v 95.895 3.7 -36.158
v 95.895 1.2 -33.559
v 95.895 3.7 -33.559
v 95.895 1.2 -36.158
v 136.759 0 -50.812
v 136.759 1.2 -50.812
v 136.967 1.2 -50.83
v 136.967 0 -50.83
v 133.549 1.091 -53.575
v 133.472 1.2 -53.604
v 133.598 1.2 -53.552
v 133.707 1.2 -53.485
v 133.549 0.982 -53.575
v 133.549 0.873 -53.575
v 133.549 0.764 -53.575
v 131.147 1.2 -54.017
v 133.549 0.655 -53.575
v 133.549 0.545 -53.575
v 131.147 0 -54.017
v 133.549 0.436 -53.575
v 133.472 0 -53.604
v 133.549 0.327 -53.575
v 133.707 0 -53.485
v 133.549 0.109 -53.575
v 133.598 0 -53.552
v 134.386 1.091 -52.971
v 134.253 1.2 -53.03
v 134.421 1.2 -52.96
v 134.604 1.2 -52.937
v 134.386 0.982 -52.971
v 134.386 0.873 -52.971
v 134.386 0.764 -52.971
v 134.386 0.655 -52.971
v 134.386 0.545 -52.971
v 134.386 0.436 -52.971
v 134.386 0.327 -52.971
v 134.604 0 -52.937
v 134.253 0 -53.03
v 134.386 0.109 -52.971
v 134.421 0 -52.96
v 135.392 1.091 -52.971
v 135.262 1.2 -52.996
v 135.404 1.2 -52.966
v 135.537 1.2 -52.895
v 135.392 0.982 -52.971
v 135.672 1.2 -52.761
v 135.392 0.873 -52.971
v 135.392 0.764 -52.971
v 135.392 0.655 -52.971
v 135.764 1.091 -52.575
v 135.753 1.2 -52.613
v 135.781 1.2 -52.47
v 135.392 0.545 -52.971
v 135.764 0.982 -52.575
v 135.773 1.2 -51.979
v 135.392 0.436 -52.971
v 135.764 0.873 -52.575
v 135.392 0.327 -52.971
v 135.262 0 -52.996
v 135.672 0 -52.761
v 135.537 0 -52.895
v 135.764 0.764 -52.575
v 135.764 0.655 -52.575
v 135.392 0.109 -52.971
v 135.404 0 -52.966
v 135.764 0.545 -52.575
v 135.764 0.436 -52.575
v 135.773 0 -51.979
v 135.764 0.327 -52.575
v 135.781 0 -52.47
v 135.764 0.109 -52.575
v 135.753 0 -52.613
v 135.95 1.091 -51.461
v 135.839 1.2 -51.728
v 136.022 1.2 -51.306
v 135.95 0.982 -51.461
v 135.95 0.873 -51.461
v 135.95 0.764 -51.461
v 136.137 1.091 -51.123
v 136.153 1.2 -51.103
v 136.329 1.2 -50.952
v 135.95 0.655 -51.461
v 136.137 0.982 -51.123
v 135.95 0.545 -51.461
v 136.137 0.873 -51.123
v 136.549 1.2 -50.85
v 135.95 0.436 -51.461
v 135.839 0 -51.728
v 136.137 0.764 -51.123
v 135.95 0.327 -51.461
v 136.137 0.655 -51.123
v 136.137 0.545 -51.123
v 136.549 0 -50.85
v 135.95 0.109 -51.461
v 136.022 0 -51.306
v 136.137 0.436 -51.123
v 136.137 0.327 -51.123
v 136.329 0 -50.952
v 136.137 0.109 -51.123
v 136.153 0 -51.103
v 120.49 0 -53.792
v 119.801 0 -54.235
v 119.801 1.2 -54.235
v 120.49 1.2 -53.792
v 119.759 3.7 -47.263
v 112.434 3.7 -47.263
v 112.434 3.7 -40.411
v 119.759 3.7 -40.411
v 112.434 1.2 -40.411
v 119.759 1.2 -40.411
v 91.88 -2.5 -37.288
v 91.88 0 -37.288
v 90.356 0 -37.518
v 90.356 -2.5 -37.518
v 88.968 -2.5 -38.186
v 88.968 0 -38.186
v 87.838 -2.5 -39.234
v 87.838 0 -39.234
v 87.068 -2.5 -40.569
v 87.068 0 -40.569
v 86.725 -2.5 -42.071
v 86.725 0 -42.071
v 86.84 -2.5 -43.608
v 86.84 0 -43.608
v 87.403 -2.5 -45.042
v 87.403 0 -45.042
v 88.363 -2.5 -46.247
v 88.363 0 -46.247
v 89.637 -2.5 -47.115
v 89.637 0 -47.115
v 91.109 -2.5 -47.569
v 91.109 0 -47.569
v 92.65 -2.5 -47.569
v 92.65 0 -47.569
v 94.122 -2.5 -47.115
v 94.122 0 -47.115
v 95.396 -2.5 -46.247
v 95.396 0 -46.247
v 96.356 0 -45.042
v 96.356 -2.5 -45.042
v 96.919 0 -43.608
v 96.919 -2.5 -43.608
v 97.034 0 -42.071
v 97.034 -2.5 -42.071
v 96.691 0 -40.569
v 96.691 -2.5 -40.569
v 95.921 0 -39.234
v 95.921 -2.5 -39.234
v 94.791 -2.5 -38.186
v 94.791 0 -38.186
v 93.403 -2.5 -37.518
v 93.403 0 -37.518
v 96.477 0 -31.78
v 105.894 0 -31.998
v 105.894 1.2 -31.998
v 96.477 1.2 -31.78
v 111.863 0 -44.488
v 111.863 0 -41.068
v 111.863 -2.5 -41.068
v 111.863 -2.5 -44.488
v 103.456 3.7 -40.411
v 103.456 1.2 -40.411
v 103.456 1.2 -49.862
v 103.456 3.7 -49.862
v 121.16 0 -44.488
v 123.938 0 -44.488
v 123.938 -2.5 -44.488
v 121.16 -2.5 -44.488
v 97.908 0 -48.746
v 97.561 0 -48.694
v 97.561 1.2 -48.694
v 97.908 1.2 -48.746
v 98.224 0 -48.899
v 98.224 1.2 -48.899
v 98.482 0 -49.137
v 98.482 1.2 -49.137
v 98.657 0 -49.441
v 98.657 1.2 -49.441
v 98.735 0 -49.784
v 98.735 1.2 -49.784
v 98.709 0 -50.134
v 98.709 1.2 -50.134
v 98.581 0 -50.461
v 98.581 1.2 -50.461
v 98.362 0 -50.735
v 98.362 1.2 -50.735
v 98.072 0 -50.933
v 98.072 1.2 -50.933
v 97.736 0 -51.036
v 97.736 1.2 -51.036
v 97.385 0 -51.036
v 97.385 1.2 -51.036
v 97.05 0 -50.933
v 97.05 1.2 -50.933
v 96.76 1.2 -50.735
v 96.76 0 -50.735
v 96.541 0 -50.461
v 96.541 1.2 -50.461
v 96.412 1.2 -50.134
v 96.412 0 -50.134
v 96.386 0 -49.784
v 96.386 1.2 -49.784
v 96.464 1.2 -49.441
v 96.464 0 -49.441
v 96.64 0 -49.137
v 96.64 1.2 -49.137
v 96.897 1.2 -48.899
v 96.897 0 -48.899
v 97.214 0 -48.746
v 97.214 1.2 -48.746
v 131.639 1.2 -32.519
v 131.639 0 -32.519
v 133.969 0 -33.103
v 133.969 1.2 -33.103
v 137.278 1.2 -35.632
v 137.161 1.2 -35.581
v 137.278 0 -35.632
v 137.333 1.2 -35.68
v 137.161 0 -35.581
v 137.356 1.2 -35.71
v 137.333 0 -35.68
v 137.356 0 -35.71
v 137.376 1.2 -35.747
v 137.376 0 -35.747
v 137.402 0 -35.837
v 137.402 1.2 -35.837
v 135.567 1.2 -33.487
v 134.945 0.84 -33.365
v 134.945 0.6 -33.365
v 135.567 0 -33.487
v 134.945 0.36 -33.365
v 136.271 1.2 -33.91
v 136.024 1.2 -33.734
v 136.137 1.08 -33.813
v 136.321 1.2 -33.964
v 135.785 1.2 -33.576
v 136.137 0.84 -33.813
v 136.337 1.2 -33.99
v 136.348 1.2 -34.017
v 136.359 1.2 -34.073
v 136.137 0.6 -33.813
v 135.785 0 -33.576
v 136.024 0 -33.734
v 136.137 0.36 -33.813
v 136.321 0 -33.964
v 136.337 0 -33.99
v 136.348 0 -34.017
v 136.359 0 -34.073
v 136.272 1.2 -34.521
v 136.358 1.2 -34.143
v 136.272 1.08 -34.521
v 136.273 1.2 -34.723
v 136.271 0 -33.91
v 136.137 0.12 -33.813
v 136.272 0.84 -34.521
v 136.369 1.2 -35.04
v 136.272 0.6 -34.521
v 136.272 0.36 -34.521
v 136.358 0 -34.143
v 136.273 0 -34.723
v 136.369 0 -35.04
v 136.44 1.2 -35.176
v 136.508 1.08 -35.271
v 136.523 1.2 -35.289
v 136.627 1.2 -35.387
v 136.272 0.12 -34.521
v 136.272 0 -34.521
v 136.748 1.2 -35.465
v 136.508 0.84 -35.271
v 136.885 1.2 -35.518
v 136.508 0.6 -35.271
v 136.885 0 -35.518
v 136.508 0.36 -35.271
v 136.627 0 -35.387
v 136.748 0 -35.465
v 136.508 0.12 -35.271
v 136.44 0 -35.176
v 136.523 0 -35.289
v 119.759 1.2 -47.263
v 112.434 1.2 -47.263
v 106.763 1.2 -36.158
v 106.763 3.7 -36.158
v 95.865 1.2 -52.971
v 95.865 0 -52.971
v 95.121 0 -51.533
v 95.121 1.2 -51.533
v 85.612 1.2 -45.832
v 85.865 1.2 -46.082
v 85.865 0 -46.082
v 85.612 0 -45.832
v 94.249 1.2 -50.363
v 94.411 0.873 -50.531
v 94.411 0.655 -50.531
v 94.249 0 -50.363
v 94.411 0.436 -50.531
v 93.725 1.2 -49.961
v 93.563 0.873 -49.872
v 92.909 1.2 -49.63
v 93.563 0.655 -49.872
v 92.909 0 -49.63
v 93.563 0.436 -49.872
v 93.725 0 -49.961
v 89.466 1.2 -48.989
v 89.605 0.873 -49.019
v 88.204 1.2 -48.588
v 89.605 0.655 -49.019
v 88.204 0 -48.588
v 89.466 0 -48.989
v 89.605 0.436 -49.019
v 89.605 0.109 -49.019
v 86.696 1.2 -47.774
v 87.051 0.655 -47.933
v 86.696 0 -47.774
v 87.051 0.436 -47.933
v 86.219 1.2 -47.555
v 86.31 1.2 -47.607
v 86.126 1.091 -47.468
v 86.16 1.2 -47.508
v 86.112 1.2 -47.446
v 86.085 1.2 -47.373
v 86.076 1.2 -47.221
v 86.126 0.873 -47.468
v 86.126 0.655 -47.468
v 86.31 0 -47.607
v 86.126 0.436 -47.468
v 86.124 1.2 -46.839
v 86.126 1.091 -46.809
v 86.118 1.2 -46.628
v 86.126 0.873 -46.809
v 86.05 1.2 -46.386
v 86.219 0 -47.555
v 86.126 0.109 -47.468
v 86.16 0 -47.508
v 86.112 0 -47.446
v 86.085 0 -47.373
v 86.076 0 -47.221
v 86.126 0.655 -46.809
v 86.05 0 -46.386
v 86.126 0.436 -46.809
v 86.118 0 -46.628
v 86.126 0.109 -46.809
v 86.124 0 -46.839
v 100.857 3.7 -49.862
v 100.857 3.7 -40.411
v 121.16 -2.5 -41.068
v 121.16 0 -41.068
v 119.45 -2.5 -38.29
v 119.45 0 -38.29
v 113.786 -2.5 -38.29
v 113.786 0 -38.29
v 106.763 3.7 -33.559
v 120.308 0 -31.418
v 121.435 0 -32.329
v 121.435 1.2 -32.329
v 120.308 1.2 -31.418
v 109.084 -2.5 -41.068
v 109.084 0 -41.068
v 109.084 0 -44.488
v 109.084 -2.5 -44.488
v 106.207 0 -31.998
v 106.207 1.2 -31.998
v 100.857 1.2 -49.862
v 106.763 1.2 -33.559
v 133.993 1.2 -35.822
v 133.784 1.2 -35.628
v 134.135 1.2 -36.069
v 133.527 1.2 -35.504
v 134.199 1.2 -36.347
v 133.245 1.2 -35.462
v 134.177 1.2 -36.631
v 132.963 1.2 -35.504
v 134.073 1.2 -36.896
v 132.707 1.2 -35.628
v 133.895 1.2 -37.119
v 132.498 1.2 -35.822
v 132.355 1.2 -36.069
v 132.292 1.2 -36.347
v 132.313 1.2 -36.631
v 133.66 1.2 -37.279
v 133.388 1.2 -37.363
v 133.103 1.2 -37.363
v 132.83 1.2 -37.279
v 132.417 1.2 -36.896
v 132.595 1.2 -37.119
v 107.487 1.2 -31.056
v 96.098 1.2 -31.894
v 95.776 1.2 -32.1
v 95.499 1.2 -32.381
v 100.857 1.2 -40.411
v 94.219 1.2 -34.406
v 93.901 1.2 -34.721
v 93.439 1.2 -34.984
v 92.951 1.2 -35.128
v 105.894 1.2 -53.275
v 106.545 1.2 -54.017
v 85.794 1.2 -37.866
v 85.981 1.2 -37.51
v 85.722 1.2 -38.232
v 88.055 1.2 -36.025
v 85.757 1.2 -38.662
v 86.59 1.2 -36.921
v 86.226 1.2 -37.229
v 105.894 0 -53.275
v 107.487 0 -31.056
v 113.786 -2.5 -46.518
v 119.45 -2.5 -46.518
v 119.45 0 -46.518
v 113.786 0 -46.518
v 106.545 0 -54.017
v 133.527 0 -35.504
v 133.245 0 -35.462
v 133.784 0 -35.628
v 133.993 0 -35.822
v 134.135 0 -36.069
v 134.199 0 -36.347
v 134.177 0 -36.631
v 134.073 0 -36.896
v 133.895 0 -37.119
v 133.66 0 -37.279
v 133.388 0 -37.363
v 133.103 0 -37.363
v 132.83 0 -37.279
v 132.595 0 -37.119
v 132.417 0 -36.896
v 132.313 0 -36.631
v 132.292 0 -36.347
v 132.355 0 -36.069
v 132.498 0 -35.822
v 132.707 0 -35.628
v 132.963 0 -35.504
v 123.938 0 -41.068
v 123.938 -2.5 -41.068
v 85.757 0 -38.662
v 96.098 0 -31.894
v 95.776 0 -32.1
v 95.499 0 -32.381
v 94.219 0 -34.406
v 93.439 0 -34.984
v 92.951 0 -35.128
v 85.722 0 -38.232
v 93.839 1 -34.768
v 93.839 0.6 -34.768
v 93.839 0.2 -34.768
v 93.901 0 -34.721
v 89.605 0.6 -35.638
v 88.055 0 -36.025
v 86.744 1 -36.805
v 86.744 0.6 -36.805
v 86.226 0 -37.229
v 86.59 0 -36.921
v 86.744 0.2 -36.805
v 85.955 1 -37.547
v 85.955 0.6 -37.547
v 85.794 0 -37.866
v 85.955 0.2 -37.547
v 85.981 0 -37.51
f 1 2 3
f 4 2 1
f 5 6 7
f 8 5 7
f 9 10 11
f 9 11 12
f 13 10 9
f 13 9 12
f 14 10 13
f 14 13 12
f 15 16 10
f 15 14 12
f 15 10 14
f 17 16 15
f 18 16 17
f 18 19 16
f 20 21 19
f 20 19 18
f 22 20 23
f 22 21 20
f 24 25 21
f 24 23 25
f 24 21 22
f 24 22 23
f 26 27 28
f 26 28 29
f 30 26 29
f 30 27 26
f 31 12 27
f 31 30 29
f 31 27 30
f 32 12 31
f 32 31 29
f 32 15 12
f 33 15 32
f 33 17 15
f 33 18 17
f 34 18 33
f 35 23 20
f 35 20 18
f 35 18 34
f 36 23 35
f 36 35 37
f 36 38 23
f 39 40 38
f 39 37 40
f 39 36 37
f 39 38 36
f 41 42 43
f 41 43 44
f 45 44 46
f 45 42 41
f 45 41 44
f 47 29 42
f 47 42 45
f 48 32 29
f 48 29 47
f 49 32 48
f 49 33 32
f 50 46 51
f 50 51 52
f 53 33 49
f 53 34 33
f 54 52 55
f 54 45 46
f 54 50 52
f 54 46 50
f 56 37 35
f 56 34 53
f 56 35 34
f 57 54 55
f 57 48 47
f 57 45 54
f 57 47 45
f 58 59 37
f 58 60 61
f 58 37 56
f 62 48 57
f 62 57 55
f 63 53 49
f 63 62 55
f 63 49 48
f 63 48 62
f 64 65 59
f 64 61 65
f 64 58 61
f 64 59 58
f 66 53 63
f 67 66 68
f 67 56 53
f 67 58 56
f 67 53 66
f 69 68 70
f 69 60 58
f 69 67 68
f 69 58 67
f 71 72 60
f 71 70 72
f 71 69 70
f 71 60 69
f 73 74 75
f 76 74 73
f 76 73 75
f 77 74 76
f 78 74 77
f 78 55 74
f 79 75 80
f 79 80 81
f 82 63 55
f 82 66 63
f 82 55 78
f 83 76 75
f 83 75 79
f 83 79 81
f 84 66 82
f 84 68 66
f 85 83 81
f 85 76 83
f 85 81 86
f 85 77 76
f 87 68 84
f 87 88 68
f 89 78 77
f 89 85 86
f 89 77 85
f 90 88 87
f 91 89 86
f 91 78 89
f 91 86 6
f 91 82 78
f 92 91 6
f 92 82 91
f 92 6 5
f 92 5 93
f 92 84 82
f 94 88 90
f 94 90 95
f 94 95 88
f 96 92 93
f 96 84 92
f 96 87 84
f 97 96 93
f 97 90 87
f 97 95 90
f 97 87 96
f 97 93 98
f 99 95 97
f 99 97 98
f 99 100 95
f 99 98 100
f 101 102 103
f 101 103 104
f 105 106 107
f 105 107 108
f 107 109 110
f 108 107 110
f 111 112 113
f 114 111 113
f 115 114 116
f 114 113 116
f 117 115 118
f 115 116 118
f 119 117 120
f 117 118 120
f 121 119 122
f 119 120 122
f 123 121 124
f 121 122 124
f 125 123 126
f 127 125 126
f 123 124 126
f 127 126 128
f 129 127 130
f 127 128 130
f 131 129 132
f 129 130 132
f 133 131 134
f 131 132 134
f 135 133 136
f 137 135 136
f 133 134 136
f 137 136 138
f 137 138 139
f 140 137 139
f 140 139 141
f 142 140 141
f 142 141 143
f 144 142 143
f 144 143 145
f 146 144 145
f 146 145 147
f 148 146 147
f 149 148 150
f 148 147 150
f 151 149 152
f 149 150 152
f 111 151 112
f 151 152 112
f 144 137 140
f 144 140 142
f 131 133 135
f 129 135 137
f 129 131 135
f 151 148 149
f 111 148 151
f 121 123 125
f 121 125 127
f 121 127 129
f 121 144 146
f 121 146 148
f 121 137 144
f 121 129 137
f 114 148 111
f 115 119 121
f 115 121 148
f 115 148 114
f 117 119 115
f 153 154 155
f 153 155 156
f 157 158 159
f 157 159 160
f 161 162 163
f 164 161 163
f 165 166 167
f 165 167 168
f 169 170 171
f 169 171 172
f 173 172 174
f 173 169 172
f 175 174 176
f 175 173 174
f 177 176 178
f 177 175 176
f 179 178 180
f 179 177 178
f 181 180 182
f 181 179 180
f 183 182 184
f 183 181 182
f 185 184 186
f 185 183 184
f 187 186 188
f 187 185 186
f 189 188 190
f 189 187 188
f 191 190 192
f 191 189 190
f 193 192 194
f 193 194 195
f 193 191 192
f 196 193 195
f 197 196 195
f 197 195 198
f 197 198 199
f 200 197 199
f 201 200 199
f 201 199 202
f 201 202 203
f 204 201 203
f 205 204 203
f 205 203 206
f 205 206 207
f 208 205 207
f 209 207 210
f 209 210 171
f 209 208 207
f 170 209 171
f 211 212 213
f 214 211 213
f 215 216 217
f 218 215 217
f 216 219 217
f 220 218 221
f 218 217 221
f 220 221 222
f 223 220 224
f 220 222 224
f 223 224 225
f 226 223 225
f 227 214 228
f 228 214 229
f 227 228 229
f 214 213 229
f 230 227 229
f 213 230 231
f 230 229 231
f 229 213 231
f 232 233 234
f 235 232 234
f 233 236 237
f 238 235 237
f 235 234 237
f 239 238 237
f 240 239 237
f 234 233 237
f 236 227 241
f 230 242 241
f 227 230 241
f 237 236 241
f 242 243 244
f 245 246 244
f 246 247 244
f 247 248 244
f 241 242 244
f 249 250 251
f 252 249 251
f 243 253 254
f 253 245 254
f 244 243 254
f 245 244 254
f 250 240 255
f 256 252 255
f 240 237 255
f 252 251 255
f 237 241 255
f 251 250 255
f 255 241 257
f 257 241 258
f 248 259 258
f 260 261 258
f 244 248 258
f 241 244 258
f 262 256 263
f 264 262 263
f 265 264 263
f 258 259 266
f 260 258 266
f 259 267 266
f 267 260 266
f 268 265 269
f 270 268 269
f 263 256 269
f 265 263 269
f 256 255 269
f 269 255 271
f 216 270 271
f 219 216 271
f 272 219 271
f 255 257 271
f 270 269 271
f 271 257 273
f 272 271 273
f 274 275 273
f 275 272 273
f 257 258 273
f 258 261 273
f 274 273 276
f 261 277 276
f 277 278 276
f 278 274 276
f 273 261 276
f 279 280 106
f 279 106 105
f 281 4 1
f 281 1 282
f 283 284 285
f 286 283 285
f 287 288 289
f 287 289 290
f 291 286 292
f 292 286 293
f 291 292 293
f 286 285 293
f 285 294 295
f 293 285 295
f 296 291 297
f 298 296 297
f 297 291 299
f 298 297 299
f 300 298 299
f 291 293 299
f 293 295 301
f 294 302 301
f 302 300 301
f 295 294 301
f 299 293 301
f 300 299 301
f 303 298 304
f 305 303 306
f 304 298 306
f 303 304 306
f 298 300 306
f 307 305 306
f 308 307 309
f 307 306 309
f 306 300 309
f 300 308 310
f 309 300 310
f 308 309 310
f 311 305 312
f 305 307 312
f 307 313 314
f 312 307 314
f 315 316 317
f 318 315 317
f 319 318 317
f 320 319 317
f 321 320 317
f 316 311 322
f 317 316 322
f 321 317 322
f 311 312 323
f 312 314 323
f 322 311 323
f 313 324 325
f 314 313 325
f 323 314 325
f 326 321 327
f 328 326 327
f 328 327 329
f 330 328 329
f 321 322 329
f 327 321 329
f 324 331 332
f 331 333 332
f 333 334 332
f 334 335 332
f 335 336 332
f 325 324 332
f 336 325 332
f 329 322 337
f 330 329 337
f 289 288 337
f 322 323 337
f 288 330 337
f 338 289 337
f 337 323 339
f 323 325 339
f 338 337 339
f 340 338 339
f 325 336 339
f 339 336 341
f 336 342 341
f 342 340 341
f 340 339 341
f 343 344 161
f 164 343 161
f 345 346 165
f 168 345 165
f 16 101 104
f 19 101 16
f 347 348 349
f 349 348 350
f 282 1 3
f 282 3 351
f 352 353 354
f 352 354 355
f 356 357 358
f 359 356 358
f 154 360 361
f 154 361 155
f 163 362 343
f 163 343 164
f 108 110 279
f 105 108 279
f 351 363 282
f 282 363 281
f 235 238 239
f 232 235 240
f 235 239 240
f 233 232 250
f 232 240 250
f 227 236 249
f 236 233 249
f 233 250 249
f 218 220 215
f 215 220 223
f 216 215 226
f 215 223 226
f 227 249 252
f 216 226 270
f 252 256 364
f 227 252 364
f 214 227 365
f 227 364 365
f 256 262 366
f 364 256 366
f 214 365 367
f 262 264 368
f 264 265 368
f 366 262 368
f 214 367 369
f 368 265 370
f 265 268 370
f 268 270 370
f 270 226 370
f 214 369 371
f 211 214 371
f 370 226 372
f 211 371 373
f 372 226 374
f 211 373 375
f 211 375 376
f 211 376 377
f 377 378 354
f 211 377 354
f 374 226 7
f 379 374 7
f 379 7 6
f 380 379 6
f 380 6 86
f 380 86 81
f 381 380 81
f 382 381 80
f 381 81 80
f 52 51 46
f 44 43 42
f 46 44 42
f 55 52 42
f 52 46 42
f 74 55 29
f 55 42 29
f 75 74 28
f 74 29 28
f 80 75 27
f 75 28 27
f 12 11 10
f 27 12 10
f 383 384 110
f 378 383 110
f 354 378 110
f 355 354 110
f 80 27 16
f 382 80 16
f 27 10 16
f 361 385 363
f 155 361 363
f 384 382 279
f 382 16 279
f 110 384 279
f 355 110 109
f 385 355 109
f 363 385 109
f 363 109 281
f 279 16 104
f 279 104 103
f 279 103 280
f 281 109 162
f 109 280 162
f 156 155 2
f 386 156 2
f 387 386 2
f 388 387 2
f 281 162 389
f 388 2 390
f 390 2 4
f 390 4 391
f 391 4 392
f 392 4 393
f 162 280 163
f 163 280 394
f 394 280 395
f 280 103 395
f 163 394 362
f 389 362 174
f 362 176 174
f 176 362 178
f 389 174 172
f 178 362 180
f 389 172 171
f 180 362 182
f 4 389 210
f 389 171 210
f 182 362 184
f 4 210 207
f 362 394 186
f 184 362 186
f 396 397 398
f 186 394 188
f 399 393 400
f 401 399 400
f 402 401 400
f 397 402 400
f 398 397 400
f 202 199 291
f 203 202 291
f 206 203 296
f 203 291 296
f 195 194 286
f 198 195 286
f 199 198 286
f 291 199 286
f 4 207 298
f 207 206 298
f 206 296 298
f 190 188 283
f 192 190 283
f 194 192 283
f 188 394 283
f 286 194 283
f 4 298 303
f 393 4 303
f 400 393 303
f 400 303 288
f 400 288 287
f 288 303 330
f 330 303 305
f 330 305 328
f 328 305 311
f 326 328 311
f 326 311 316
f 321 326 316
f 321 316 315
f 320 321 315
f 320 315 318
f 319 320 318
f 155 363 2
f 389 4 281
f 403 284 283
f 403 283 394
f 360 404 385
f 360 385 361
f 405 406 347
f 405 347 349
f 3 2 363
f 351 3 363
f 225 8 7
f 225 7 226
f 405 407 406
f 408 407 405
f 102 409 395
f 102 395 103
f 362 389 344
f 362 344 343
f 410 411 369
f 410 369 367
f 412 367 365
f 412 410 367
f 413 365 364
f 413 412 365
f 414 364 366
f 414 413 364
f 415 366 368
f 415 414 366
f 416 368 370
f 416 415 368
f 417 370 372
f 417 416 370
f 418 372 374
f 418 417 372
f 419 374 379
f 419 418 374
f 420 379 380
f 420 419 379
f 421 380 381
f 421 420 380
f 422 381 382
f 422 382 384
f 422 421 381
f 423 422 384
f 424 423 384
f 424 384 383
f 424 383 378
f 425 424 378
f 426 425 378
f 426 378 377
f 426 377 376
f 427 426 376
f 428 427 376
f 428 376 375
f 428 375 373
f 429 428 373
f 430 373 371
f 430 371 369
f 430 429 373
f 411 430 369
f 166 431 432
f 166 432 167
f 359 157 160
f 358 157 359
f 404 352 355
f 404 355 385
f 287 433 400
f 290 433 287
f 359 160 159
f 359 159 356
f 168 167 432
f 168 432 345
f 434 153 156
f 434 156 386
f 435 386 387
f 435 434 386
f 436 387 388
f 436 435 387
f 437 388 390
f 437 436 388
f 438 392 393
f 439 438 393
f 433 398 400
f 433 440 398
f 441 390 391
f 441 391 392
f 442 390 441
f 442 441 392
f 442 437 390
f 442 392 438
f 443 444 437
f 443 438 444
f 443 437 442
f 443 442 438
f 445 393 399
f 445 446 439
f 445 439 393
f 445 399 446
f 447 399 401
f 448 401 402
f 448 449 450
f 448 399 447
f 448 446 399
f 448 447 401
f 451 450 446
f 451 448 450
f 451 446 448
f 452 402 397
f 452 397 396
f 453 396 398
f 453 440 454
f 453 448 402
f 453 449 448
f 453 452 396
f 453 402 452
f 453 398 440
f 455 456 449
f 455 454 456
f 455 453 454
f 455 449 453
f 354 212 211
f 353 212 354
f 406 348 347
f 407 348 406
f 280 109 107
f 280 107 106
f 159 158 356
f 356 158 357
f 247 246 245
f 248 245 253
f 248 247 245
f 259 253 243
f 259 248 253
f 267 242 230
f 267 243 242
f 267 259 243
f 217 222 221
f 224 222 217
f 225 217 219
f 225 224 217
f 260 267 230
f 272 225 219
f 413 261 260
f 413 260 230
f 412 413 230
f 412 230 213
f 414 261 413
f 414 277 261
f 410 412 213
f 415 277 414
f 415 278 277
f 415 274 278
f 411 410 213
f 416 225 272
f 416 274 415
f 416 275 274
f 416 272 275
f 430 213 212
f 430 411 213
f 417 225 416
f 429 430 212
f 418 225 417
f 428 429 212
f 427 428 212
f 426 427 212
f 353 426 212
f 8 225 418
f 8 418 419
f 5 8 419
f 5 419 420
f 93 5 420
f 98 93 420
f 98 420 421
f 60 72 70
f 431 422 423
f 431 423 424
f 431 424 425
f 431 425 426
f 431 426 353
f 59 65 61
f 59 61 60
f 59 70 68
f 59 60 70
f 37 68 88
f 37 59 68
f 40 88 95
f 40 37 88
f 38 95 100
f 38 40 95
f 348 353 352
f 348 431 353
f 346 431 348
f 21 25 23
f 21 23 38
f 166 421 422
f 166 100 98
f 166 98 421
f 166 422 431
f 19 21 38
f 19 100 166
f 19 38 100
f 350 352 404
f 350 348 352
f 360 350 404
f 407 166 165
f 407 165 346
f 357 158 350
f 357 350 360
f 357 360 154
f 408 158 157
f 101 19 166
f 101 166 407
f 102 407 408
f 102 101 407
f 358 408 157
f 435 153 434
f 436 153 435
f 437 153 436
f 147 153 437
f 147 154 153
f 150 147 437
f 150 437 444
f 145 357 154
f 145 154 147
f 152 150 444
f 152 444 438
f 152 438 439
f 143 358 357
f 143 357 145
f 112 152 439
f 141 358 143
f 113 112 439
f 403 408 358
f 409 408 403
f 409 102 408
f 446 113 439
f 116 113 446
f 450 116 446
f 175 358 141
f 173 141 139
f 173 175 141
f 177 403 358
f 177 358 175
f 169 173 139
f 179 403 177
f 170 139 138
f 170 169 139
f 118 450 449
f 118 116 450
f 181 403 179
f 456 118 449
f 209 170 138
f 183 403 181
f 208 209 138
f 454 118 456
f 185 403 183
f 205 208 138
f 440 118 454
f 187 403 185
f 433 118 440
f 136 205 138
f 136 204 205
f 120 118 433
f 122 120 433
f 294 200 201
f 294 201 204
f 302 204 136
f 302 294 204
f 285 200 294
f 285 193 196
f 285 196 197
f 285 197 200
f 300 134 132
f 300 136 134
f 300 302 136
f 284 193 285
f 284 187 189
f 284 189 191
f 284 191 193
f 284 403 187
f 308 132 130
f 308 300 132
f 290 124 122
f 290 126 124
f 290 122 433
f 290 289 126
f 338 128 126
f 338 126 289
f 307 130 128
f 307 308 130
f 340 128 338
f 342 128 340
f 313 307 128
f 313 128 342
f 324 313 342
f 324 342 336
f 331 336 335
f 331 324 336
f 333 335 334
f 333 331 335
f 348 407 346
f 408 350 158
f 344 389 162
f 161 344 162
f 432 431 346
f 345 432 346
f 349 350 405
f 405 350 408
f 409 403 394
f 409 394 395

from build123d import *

# Parameters (mm, degrees)
SKETCH_1_R      = 1.177850969
SKETCH_1_R_2    = 0.956106654
EXTRUDE_1_DEPTH = 1.2
SKETCH_2_W      = 2.599009716
SKETCH_2_H      = 9.450944424
SKETCH_2_W_2    = 10.868586088
SKETCH_2_H_2    = 2.599009716
SKETCH_2_W_3    = 7.324481929
SKETCH_2_H_3    = 6.851934707
EXTRUDE_2_DEPTH = 2.5
SKETCH_3_R      = 5.169319594
SKETCH_3_W      = 5.663714124
SKETCH_3_H      = 8.228414859
SKETCH_3_W_2    = 2.778425797
SKETCH_3_H_2    = 3.41960098
SKETCH_3_W_3    = 2.778425796
EXTRUDE_3_DEPTH = 2.5


with BuildPart() as part:
    # 草图1 → 凸台-拉伸1 (new body)
    with BuildSketch(Plane(origin=(0, 0, 0), x_dir=(1, 0, 0), z_dir=(0, 1, 0))):
        with BuildLine():
            Line((105.893591271, 53.275125851), (106.545491392, 54.017421076))
            Line((106.545491392, 54.017421076), (119.800793841, 54.234721116))
            Line((119.800793841, 54.234721116), (120.490485419, 53.791652828))
            Line((120.490485419, 53.791652828), (131.147108858, 54.017421076))
            add(Edge.make_bspline(
                [(131.147108858, 54.017421076), (131.789812794, 53.996837003), (132.271032583, 53.806185271), (133.59141416, 53.64309442), (133.864212106, 53.332445087), (134.378478508, 52.88451723), (134.906596474, 52.964229893), (135.436516912, 53.046704607), (135.857819818, 52.60303085), (135.699488705, 52.022001546), (135.915728679, 51.540366189), (136.18029414, 50.941982759), (136.67307375, 50.758709494), (136.967497013, 50.83035382)],
                knots=[0, 0, 0, 0, 0.188730146, 0.316316472, 0.403184148, 0.474447883, 0.548055379, 0.606941376, 0.67849208, 0.743591437, 0.828920553, 0.87978435, 1, 1, 1, 1], degree=3))
            Line((136.967497013, 50.83035382), (137.402097093, 35.83665105))
            add(Edge.make_bspline(
                [(131.638888225, 32.519167476), (132.289752245, 32.591172314), (133.399864021, 32.891144985), (134.719329611, 33.372405259), (135.679325757, 33.455694566), (136.069567013, 33.777495704), (136.465876162, 34.019032832), (136.210256018, 34.494885125), (136.309070885, 34.9305834), (136.493026809, 35.307181869), (136.911878339, 35.60133562), (137.35507181, 35.550553674), (137.402097093, 35.83665105)],
                knots=[0, 0, 0, 0, 0.265050769, 0.461165322, 0.575032701, 0.635406808, 0.669813837, 0.743469123, 0.801324936, 0.85139451, 0.909102062, 1, 1, 1, 1], degree=3))
            Line((131.638888225, 32.519167476), (121.435281065, 32.328801671))
            Line((121.435281065, 32.328801671), (120.307827268, 31.4182169))
            Line((120.307827268, 31.4182169), (107.487124899, 31.056050167))
            Line((107.487124899, 31.056050167), (106.206955659, 31.997683674))
            Line((106.206955659, 31.997683674), (105.893591271, 31.997683674))
            Line((105.893591271, 31.997683674), (96.477256198, 31.780383634))
            add(Edge.make_bspline(
                [(96.477256198, 31.780383634), (95.119394991, 31.979098062), (94.768281493, 35.025160472), (91.7555269, 35.258354273), (89.816296815, 35.594946638), (87.972336143, 35.939221074), (86.505310233, 36.951790617), (85.565925603, 37.723763036), (85.757120884, 38.661551572)],
                knots=[0, 0, 0, 0, 0.292440776, 0.436631494, 0.610009415, 0.740354216, 0.839144899, 1, 1, 1, 1], degree=3))
            Line((85.757120884, 38.661551572), (85.61225419, 45.832452897))
            add(Edge.make_bspline(
                [(95.865148312, 52.970520199), (95.699375208, 52.414012473), (95.170628458, 51.625033595), (94.478178944, 50.509216035), (93.429531129, 49.673120616), (91.694996172, 49.414444997), (89.907832195, 49.103478144), (88.214733513, 48.696875462), (87.251206893, 47.989012234), (86.546009542, 47.716130479), (85.959637368, 47.453239242), (86.287299163, 46.596327956), (85.902100101, 46.067142496), (85.61225419, 45.832452897)],
                knots=[0, 0, 0, 0, 0.125583195, 0.209641712, 0.288634899, 0.412114343, 0.586659681, 0.693684, 0.791997458, 0.841790879, 0.868337506, 0.916807277, 1, 1, 1, 1], degree=3))
            Line((95.865148312, 52.970520199), (105.893591271, 53.275125851))
        make_face()
        with Locations(Location((97.560690211, 49.871714609, 0), (0, 0, 270))):
            Circle(SKETCH_1_R, mode=Mode.SUBTRACT)
        with Locations(Location((133.245133696, 36.418008614, 0), (0, 0, 270))):
            Circle(SKETCH_1_R_2, mode=Mode.SUBTRACT)
    extrude(amount=EXTRUDE_1_DEPTH)

    # 草图2 → 凸台-拉伸2 (add)
    with BuildSketch(Plane(origin=(0, 1.2, 0), x_dir=(1, 0, 0), z_dir=(0, 1, 0))):
        with Locations((102.156162403, 45.136585694)):
            Rectangle(SKETCH_2_W, SKETCH_2_H)
        with Locations((101.329204766, 34.858683633)):
            Rectangle(SKETCH_2_W_2, SKETCH_2_H_2)
        with Locations((116.096305429, 43.837080836)):
            Rectangle(SKETCH_2_W_3, SKETCH_2_H_3)
    extrude(amount=EXTRUDE_2_DEPTH)

    # 草图3 → 凸台-拉伸3 (add)
    with BuildSketch(Plane(origin=(0, 0, 0), x_dir=(-1, 0, 0), z_dir=(0, -1, 0))):
        with Locations(Location((-91.879503332, 42.457445362, 0), (0, 0, 270))):
            Circle(SKETCH_3_R)
        with Locations((-116.618179174, 42.404014097)):
            Rectangle(SKETCH_3_W, SKETCH_3_H)
        with Locations((-122.549049625, 42.778032954)):
            Rectangle(SKETCH_3_W_2, SKETCH_3_H_2)
        with Locations((-110.473583663, 42.778032954)):
            Rectangle(SKETCH_3_W_3, SKETCH_3_H_2)
    extrude(amount=EXTRUDE_3_DEPTH)


solid = part.part
